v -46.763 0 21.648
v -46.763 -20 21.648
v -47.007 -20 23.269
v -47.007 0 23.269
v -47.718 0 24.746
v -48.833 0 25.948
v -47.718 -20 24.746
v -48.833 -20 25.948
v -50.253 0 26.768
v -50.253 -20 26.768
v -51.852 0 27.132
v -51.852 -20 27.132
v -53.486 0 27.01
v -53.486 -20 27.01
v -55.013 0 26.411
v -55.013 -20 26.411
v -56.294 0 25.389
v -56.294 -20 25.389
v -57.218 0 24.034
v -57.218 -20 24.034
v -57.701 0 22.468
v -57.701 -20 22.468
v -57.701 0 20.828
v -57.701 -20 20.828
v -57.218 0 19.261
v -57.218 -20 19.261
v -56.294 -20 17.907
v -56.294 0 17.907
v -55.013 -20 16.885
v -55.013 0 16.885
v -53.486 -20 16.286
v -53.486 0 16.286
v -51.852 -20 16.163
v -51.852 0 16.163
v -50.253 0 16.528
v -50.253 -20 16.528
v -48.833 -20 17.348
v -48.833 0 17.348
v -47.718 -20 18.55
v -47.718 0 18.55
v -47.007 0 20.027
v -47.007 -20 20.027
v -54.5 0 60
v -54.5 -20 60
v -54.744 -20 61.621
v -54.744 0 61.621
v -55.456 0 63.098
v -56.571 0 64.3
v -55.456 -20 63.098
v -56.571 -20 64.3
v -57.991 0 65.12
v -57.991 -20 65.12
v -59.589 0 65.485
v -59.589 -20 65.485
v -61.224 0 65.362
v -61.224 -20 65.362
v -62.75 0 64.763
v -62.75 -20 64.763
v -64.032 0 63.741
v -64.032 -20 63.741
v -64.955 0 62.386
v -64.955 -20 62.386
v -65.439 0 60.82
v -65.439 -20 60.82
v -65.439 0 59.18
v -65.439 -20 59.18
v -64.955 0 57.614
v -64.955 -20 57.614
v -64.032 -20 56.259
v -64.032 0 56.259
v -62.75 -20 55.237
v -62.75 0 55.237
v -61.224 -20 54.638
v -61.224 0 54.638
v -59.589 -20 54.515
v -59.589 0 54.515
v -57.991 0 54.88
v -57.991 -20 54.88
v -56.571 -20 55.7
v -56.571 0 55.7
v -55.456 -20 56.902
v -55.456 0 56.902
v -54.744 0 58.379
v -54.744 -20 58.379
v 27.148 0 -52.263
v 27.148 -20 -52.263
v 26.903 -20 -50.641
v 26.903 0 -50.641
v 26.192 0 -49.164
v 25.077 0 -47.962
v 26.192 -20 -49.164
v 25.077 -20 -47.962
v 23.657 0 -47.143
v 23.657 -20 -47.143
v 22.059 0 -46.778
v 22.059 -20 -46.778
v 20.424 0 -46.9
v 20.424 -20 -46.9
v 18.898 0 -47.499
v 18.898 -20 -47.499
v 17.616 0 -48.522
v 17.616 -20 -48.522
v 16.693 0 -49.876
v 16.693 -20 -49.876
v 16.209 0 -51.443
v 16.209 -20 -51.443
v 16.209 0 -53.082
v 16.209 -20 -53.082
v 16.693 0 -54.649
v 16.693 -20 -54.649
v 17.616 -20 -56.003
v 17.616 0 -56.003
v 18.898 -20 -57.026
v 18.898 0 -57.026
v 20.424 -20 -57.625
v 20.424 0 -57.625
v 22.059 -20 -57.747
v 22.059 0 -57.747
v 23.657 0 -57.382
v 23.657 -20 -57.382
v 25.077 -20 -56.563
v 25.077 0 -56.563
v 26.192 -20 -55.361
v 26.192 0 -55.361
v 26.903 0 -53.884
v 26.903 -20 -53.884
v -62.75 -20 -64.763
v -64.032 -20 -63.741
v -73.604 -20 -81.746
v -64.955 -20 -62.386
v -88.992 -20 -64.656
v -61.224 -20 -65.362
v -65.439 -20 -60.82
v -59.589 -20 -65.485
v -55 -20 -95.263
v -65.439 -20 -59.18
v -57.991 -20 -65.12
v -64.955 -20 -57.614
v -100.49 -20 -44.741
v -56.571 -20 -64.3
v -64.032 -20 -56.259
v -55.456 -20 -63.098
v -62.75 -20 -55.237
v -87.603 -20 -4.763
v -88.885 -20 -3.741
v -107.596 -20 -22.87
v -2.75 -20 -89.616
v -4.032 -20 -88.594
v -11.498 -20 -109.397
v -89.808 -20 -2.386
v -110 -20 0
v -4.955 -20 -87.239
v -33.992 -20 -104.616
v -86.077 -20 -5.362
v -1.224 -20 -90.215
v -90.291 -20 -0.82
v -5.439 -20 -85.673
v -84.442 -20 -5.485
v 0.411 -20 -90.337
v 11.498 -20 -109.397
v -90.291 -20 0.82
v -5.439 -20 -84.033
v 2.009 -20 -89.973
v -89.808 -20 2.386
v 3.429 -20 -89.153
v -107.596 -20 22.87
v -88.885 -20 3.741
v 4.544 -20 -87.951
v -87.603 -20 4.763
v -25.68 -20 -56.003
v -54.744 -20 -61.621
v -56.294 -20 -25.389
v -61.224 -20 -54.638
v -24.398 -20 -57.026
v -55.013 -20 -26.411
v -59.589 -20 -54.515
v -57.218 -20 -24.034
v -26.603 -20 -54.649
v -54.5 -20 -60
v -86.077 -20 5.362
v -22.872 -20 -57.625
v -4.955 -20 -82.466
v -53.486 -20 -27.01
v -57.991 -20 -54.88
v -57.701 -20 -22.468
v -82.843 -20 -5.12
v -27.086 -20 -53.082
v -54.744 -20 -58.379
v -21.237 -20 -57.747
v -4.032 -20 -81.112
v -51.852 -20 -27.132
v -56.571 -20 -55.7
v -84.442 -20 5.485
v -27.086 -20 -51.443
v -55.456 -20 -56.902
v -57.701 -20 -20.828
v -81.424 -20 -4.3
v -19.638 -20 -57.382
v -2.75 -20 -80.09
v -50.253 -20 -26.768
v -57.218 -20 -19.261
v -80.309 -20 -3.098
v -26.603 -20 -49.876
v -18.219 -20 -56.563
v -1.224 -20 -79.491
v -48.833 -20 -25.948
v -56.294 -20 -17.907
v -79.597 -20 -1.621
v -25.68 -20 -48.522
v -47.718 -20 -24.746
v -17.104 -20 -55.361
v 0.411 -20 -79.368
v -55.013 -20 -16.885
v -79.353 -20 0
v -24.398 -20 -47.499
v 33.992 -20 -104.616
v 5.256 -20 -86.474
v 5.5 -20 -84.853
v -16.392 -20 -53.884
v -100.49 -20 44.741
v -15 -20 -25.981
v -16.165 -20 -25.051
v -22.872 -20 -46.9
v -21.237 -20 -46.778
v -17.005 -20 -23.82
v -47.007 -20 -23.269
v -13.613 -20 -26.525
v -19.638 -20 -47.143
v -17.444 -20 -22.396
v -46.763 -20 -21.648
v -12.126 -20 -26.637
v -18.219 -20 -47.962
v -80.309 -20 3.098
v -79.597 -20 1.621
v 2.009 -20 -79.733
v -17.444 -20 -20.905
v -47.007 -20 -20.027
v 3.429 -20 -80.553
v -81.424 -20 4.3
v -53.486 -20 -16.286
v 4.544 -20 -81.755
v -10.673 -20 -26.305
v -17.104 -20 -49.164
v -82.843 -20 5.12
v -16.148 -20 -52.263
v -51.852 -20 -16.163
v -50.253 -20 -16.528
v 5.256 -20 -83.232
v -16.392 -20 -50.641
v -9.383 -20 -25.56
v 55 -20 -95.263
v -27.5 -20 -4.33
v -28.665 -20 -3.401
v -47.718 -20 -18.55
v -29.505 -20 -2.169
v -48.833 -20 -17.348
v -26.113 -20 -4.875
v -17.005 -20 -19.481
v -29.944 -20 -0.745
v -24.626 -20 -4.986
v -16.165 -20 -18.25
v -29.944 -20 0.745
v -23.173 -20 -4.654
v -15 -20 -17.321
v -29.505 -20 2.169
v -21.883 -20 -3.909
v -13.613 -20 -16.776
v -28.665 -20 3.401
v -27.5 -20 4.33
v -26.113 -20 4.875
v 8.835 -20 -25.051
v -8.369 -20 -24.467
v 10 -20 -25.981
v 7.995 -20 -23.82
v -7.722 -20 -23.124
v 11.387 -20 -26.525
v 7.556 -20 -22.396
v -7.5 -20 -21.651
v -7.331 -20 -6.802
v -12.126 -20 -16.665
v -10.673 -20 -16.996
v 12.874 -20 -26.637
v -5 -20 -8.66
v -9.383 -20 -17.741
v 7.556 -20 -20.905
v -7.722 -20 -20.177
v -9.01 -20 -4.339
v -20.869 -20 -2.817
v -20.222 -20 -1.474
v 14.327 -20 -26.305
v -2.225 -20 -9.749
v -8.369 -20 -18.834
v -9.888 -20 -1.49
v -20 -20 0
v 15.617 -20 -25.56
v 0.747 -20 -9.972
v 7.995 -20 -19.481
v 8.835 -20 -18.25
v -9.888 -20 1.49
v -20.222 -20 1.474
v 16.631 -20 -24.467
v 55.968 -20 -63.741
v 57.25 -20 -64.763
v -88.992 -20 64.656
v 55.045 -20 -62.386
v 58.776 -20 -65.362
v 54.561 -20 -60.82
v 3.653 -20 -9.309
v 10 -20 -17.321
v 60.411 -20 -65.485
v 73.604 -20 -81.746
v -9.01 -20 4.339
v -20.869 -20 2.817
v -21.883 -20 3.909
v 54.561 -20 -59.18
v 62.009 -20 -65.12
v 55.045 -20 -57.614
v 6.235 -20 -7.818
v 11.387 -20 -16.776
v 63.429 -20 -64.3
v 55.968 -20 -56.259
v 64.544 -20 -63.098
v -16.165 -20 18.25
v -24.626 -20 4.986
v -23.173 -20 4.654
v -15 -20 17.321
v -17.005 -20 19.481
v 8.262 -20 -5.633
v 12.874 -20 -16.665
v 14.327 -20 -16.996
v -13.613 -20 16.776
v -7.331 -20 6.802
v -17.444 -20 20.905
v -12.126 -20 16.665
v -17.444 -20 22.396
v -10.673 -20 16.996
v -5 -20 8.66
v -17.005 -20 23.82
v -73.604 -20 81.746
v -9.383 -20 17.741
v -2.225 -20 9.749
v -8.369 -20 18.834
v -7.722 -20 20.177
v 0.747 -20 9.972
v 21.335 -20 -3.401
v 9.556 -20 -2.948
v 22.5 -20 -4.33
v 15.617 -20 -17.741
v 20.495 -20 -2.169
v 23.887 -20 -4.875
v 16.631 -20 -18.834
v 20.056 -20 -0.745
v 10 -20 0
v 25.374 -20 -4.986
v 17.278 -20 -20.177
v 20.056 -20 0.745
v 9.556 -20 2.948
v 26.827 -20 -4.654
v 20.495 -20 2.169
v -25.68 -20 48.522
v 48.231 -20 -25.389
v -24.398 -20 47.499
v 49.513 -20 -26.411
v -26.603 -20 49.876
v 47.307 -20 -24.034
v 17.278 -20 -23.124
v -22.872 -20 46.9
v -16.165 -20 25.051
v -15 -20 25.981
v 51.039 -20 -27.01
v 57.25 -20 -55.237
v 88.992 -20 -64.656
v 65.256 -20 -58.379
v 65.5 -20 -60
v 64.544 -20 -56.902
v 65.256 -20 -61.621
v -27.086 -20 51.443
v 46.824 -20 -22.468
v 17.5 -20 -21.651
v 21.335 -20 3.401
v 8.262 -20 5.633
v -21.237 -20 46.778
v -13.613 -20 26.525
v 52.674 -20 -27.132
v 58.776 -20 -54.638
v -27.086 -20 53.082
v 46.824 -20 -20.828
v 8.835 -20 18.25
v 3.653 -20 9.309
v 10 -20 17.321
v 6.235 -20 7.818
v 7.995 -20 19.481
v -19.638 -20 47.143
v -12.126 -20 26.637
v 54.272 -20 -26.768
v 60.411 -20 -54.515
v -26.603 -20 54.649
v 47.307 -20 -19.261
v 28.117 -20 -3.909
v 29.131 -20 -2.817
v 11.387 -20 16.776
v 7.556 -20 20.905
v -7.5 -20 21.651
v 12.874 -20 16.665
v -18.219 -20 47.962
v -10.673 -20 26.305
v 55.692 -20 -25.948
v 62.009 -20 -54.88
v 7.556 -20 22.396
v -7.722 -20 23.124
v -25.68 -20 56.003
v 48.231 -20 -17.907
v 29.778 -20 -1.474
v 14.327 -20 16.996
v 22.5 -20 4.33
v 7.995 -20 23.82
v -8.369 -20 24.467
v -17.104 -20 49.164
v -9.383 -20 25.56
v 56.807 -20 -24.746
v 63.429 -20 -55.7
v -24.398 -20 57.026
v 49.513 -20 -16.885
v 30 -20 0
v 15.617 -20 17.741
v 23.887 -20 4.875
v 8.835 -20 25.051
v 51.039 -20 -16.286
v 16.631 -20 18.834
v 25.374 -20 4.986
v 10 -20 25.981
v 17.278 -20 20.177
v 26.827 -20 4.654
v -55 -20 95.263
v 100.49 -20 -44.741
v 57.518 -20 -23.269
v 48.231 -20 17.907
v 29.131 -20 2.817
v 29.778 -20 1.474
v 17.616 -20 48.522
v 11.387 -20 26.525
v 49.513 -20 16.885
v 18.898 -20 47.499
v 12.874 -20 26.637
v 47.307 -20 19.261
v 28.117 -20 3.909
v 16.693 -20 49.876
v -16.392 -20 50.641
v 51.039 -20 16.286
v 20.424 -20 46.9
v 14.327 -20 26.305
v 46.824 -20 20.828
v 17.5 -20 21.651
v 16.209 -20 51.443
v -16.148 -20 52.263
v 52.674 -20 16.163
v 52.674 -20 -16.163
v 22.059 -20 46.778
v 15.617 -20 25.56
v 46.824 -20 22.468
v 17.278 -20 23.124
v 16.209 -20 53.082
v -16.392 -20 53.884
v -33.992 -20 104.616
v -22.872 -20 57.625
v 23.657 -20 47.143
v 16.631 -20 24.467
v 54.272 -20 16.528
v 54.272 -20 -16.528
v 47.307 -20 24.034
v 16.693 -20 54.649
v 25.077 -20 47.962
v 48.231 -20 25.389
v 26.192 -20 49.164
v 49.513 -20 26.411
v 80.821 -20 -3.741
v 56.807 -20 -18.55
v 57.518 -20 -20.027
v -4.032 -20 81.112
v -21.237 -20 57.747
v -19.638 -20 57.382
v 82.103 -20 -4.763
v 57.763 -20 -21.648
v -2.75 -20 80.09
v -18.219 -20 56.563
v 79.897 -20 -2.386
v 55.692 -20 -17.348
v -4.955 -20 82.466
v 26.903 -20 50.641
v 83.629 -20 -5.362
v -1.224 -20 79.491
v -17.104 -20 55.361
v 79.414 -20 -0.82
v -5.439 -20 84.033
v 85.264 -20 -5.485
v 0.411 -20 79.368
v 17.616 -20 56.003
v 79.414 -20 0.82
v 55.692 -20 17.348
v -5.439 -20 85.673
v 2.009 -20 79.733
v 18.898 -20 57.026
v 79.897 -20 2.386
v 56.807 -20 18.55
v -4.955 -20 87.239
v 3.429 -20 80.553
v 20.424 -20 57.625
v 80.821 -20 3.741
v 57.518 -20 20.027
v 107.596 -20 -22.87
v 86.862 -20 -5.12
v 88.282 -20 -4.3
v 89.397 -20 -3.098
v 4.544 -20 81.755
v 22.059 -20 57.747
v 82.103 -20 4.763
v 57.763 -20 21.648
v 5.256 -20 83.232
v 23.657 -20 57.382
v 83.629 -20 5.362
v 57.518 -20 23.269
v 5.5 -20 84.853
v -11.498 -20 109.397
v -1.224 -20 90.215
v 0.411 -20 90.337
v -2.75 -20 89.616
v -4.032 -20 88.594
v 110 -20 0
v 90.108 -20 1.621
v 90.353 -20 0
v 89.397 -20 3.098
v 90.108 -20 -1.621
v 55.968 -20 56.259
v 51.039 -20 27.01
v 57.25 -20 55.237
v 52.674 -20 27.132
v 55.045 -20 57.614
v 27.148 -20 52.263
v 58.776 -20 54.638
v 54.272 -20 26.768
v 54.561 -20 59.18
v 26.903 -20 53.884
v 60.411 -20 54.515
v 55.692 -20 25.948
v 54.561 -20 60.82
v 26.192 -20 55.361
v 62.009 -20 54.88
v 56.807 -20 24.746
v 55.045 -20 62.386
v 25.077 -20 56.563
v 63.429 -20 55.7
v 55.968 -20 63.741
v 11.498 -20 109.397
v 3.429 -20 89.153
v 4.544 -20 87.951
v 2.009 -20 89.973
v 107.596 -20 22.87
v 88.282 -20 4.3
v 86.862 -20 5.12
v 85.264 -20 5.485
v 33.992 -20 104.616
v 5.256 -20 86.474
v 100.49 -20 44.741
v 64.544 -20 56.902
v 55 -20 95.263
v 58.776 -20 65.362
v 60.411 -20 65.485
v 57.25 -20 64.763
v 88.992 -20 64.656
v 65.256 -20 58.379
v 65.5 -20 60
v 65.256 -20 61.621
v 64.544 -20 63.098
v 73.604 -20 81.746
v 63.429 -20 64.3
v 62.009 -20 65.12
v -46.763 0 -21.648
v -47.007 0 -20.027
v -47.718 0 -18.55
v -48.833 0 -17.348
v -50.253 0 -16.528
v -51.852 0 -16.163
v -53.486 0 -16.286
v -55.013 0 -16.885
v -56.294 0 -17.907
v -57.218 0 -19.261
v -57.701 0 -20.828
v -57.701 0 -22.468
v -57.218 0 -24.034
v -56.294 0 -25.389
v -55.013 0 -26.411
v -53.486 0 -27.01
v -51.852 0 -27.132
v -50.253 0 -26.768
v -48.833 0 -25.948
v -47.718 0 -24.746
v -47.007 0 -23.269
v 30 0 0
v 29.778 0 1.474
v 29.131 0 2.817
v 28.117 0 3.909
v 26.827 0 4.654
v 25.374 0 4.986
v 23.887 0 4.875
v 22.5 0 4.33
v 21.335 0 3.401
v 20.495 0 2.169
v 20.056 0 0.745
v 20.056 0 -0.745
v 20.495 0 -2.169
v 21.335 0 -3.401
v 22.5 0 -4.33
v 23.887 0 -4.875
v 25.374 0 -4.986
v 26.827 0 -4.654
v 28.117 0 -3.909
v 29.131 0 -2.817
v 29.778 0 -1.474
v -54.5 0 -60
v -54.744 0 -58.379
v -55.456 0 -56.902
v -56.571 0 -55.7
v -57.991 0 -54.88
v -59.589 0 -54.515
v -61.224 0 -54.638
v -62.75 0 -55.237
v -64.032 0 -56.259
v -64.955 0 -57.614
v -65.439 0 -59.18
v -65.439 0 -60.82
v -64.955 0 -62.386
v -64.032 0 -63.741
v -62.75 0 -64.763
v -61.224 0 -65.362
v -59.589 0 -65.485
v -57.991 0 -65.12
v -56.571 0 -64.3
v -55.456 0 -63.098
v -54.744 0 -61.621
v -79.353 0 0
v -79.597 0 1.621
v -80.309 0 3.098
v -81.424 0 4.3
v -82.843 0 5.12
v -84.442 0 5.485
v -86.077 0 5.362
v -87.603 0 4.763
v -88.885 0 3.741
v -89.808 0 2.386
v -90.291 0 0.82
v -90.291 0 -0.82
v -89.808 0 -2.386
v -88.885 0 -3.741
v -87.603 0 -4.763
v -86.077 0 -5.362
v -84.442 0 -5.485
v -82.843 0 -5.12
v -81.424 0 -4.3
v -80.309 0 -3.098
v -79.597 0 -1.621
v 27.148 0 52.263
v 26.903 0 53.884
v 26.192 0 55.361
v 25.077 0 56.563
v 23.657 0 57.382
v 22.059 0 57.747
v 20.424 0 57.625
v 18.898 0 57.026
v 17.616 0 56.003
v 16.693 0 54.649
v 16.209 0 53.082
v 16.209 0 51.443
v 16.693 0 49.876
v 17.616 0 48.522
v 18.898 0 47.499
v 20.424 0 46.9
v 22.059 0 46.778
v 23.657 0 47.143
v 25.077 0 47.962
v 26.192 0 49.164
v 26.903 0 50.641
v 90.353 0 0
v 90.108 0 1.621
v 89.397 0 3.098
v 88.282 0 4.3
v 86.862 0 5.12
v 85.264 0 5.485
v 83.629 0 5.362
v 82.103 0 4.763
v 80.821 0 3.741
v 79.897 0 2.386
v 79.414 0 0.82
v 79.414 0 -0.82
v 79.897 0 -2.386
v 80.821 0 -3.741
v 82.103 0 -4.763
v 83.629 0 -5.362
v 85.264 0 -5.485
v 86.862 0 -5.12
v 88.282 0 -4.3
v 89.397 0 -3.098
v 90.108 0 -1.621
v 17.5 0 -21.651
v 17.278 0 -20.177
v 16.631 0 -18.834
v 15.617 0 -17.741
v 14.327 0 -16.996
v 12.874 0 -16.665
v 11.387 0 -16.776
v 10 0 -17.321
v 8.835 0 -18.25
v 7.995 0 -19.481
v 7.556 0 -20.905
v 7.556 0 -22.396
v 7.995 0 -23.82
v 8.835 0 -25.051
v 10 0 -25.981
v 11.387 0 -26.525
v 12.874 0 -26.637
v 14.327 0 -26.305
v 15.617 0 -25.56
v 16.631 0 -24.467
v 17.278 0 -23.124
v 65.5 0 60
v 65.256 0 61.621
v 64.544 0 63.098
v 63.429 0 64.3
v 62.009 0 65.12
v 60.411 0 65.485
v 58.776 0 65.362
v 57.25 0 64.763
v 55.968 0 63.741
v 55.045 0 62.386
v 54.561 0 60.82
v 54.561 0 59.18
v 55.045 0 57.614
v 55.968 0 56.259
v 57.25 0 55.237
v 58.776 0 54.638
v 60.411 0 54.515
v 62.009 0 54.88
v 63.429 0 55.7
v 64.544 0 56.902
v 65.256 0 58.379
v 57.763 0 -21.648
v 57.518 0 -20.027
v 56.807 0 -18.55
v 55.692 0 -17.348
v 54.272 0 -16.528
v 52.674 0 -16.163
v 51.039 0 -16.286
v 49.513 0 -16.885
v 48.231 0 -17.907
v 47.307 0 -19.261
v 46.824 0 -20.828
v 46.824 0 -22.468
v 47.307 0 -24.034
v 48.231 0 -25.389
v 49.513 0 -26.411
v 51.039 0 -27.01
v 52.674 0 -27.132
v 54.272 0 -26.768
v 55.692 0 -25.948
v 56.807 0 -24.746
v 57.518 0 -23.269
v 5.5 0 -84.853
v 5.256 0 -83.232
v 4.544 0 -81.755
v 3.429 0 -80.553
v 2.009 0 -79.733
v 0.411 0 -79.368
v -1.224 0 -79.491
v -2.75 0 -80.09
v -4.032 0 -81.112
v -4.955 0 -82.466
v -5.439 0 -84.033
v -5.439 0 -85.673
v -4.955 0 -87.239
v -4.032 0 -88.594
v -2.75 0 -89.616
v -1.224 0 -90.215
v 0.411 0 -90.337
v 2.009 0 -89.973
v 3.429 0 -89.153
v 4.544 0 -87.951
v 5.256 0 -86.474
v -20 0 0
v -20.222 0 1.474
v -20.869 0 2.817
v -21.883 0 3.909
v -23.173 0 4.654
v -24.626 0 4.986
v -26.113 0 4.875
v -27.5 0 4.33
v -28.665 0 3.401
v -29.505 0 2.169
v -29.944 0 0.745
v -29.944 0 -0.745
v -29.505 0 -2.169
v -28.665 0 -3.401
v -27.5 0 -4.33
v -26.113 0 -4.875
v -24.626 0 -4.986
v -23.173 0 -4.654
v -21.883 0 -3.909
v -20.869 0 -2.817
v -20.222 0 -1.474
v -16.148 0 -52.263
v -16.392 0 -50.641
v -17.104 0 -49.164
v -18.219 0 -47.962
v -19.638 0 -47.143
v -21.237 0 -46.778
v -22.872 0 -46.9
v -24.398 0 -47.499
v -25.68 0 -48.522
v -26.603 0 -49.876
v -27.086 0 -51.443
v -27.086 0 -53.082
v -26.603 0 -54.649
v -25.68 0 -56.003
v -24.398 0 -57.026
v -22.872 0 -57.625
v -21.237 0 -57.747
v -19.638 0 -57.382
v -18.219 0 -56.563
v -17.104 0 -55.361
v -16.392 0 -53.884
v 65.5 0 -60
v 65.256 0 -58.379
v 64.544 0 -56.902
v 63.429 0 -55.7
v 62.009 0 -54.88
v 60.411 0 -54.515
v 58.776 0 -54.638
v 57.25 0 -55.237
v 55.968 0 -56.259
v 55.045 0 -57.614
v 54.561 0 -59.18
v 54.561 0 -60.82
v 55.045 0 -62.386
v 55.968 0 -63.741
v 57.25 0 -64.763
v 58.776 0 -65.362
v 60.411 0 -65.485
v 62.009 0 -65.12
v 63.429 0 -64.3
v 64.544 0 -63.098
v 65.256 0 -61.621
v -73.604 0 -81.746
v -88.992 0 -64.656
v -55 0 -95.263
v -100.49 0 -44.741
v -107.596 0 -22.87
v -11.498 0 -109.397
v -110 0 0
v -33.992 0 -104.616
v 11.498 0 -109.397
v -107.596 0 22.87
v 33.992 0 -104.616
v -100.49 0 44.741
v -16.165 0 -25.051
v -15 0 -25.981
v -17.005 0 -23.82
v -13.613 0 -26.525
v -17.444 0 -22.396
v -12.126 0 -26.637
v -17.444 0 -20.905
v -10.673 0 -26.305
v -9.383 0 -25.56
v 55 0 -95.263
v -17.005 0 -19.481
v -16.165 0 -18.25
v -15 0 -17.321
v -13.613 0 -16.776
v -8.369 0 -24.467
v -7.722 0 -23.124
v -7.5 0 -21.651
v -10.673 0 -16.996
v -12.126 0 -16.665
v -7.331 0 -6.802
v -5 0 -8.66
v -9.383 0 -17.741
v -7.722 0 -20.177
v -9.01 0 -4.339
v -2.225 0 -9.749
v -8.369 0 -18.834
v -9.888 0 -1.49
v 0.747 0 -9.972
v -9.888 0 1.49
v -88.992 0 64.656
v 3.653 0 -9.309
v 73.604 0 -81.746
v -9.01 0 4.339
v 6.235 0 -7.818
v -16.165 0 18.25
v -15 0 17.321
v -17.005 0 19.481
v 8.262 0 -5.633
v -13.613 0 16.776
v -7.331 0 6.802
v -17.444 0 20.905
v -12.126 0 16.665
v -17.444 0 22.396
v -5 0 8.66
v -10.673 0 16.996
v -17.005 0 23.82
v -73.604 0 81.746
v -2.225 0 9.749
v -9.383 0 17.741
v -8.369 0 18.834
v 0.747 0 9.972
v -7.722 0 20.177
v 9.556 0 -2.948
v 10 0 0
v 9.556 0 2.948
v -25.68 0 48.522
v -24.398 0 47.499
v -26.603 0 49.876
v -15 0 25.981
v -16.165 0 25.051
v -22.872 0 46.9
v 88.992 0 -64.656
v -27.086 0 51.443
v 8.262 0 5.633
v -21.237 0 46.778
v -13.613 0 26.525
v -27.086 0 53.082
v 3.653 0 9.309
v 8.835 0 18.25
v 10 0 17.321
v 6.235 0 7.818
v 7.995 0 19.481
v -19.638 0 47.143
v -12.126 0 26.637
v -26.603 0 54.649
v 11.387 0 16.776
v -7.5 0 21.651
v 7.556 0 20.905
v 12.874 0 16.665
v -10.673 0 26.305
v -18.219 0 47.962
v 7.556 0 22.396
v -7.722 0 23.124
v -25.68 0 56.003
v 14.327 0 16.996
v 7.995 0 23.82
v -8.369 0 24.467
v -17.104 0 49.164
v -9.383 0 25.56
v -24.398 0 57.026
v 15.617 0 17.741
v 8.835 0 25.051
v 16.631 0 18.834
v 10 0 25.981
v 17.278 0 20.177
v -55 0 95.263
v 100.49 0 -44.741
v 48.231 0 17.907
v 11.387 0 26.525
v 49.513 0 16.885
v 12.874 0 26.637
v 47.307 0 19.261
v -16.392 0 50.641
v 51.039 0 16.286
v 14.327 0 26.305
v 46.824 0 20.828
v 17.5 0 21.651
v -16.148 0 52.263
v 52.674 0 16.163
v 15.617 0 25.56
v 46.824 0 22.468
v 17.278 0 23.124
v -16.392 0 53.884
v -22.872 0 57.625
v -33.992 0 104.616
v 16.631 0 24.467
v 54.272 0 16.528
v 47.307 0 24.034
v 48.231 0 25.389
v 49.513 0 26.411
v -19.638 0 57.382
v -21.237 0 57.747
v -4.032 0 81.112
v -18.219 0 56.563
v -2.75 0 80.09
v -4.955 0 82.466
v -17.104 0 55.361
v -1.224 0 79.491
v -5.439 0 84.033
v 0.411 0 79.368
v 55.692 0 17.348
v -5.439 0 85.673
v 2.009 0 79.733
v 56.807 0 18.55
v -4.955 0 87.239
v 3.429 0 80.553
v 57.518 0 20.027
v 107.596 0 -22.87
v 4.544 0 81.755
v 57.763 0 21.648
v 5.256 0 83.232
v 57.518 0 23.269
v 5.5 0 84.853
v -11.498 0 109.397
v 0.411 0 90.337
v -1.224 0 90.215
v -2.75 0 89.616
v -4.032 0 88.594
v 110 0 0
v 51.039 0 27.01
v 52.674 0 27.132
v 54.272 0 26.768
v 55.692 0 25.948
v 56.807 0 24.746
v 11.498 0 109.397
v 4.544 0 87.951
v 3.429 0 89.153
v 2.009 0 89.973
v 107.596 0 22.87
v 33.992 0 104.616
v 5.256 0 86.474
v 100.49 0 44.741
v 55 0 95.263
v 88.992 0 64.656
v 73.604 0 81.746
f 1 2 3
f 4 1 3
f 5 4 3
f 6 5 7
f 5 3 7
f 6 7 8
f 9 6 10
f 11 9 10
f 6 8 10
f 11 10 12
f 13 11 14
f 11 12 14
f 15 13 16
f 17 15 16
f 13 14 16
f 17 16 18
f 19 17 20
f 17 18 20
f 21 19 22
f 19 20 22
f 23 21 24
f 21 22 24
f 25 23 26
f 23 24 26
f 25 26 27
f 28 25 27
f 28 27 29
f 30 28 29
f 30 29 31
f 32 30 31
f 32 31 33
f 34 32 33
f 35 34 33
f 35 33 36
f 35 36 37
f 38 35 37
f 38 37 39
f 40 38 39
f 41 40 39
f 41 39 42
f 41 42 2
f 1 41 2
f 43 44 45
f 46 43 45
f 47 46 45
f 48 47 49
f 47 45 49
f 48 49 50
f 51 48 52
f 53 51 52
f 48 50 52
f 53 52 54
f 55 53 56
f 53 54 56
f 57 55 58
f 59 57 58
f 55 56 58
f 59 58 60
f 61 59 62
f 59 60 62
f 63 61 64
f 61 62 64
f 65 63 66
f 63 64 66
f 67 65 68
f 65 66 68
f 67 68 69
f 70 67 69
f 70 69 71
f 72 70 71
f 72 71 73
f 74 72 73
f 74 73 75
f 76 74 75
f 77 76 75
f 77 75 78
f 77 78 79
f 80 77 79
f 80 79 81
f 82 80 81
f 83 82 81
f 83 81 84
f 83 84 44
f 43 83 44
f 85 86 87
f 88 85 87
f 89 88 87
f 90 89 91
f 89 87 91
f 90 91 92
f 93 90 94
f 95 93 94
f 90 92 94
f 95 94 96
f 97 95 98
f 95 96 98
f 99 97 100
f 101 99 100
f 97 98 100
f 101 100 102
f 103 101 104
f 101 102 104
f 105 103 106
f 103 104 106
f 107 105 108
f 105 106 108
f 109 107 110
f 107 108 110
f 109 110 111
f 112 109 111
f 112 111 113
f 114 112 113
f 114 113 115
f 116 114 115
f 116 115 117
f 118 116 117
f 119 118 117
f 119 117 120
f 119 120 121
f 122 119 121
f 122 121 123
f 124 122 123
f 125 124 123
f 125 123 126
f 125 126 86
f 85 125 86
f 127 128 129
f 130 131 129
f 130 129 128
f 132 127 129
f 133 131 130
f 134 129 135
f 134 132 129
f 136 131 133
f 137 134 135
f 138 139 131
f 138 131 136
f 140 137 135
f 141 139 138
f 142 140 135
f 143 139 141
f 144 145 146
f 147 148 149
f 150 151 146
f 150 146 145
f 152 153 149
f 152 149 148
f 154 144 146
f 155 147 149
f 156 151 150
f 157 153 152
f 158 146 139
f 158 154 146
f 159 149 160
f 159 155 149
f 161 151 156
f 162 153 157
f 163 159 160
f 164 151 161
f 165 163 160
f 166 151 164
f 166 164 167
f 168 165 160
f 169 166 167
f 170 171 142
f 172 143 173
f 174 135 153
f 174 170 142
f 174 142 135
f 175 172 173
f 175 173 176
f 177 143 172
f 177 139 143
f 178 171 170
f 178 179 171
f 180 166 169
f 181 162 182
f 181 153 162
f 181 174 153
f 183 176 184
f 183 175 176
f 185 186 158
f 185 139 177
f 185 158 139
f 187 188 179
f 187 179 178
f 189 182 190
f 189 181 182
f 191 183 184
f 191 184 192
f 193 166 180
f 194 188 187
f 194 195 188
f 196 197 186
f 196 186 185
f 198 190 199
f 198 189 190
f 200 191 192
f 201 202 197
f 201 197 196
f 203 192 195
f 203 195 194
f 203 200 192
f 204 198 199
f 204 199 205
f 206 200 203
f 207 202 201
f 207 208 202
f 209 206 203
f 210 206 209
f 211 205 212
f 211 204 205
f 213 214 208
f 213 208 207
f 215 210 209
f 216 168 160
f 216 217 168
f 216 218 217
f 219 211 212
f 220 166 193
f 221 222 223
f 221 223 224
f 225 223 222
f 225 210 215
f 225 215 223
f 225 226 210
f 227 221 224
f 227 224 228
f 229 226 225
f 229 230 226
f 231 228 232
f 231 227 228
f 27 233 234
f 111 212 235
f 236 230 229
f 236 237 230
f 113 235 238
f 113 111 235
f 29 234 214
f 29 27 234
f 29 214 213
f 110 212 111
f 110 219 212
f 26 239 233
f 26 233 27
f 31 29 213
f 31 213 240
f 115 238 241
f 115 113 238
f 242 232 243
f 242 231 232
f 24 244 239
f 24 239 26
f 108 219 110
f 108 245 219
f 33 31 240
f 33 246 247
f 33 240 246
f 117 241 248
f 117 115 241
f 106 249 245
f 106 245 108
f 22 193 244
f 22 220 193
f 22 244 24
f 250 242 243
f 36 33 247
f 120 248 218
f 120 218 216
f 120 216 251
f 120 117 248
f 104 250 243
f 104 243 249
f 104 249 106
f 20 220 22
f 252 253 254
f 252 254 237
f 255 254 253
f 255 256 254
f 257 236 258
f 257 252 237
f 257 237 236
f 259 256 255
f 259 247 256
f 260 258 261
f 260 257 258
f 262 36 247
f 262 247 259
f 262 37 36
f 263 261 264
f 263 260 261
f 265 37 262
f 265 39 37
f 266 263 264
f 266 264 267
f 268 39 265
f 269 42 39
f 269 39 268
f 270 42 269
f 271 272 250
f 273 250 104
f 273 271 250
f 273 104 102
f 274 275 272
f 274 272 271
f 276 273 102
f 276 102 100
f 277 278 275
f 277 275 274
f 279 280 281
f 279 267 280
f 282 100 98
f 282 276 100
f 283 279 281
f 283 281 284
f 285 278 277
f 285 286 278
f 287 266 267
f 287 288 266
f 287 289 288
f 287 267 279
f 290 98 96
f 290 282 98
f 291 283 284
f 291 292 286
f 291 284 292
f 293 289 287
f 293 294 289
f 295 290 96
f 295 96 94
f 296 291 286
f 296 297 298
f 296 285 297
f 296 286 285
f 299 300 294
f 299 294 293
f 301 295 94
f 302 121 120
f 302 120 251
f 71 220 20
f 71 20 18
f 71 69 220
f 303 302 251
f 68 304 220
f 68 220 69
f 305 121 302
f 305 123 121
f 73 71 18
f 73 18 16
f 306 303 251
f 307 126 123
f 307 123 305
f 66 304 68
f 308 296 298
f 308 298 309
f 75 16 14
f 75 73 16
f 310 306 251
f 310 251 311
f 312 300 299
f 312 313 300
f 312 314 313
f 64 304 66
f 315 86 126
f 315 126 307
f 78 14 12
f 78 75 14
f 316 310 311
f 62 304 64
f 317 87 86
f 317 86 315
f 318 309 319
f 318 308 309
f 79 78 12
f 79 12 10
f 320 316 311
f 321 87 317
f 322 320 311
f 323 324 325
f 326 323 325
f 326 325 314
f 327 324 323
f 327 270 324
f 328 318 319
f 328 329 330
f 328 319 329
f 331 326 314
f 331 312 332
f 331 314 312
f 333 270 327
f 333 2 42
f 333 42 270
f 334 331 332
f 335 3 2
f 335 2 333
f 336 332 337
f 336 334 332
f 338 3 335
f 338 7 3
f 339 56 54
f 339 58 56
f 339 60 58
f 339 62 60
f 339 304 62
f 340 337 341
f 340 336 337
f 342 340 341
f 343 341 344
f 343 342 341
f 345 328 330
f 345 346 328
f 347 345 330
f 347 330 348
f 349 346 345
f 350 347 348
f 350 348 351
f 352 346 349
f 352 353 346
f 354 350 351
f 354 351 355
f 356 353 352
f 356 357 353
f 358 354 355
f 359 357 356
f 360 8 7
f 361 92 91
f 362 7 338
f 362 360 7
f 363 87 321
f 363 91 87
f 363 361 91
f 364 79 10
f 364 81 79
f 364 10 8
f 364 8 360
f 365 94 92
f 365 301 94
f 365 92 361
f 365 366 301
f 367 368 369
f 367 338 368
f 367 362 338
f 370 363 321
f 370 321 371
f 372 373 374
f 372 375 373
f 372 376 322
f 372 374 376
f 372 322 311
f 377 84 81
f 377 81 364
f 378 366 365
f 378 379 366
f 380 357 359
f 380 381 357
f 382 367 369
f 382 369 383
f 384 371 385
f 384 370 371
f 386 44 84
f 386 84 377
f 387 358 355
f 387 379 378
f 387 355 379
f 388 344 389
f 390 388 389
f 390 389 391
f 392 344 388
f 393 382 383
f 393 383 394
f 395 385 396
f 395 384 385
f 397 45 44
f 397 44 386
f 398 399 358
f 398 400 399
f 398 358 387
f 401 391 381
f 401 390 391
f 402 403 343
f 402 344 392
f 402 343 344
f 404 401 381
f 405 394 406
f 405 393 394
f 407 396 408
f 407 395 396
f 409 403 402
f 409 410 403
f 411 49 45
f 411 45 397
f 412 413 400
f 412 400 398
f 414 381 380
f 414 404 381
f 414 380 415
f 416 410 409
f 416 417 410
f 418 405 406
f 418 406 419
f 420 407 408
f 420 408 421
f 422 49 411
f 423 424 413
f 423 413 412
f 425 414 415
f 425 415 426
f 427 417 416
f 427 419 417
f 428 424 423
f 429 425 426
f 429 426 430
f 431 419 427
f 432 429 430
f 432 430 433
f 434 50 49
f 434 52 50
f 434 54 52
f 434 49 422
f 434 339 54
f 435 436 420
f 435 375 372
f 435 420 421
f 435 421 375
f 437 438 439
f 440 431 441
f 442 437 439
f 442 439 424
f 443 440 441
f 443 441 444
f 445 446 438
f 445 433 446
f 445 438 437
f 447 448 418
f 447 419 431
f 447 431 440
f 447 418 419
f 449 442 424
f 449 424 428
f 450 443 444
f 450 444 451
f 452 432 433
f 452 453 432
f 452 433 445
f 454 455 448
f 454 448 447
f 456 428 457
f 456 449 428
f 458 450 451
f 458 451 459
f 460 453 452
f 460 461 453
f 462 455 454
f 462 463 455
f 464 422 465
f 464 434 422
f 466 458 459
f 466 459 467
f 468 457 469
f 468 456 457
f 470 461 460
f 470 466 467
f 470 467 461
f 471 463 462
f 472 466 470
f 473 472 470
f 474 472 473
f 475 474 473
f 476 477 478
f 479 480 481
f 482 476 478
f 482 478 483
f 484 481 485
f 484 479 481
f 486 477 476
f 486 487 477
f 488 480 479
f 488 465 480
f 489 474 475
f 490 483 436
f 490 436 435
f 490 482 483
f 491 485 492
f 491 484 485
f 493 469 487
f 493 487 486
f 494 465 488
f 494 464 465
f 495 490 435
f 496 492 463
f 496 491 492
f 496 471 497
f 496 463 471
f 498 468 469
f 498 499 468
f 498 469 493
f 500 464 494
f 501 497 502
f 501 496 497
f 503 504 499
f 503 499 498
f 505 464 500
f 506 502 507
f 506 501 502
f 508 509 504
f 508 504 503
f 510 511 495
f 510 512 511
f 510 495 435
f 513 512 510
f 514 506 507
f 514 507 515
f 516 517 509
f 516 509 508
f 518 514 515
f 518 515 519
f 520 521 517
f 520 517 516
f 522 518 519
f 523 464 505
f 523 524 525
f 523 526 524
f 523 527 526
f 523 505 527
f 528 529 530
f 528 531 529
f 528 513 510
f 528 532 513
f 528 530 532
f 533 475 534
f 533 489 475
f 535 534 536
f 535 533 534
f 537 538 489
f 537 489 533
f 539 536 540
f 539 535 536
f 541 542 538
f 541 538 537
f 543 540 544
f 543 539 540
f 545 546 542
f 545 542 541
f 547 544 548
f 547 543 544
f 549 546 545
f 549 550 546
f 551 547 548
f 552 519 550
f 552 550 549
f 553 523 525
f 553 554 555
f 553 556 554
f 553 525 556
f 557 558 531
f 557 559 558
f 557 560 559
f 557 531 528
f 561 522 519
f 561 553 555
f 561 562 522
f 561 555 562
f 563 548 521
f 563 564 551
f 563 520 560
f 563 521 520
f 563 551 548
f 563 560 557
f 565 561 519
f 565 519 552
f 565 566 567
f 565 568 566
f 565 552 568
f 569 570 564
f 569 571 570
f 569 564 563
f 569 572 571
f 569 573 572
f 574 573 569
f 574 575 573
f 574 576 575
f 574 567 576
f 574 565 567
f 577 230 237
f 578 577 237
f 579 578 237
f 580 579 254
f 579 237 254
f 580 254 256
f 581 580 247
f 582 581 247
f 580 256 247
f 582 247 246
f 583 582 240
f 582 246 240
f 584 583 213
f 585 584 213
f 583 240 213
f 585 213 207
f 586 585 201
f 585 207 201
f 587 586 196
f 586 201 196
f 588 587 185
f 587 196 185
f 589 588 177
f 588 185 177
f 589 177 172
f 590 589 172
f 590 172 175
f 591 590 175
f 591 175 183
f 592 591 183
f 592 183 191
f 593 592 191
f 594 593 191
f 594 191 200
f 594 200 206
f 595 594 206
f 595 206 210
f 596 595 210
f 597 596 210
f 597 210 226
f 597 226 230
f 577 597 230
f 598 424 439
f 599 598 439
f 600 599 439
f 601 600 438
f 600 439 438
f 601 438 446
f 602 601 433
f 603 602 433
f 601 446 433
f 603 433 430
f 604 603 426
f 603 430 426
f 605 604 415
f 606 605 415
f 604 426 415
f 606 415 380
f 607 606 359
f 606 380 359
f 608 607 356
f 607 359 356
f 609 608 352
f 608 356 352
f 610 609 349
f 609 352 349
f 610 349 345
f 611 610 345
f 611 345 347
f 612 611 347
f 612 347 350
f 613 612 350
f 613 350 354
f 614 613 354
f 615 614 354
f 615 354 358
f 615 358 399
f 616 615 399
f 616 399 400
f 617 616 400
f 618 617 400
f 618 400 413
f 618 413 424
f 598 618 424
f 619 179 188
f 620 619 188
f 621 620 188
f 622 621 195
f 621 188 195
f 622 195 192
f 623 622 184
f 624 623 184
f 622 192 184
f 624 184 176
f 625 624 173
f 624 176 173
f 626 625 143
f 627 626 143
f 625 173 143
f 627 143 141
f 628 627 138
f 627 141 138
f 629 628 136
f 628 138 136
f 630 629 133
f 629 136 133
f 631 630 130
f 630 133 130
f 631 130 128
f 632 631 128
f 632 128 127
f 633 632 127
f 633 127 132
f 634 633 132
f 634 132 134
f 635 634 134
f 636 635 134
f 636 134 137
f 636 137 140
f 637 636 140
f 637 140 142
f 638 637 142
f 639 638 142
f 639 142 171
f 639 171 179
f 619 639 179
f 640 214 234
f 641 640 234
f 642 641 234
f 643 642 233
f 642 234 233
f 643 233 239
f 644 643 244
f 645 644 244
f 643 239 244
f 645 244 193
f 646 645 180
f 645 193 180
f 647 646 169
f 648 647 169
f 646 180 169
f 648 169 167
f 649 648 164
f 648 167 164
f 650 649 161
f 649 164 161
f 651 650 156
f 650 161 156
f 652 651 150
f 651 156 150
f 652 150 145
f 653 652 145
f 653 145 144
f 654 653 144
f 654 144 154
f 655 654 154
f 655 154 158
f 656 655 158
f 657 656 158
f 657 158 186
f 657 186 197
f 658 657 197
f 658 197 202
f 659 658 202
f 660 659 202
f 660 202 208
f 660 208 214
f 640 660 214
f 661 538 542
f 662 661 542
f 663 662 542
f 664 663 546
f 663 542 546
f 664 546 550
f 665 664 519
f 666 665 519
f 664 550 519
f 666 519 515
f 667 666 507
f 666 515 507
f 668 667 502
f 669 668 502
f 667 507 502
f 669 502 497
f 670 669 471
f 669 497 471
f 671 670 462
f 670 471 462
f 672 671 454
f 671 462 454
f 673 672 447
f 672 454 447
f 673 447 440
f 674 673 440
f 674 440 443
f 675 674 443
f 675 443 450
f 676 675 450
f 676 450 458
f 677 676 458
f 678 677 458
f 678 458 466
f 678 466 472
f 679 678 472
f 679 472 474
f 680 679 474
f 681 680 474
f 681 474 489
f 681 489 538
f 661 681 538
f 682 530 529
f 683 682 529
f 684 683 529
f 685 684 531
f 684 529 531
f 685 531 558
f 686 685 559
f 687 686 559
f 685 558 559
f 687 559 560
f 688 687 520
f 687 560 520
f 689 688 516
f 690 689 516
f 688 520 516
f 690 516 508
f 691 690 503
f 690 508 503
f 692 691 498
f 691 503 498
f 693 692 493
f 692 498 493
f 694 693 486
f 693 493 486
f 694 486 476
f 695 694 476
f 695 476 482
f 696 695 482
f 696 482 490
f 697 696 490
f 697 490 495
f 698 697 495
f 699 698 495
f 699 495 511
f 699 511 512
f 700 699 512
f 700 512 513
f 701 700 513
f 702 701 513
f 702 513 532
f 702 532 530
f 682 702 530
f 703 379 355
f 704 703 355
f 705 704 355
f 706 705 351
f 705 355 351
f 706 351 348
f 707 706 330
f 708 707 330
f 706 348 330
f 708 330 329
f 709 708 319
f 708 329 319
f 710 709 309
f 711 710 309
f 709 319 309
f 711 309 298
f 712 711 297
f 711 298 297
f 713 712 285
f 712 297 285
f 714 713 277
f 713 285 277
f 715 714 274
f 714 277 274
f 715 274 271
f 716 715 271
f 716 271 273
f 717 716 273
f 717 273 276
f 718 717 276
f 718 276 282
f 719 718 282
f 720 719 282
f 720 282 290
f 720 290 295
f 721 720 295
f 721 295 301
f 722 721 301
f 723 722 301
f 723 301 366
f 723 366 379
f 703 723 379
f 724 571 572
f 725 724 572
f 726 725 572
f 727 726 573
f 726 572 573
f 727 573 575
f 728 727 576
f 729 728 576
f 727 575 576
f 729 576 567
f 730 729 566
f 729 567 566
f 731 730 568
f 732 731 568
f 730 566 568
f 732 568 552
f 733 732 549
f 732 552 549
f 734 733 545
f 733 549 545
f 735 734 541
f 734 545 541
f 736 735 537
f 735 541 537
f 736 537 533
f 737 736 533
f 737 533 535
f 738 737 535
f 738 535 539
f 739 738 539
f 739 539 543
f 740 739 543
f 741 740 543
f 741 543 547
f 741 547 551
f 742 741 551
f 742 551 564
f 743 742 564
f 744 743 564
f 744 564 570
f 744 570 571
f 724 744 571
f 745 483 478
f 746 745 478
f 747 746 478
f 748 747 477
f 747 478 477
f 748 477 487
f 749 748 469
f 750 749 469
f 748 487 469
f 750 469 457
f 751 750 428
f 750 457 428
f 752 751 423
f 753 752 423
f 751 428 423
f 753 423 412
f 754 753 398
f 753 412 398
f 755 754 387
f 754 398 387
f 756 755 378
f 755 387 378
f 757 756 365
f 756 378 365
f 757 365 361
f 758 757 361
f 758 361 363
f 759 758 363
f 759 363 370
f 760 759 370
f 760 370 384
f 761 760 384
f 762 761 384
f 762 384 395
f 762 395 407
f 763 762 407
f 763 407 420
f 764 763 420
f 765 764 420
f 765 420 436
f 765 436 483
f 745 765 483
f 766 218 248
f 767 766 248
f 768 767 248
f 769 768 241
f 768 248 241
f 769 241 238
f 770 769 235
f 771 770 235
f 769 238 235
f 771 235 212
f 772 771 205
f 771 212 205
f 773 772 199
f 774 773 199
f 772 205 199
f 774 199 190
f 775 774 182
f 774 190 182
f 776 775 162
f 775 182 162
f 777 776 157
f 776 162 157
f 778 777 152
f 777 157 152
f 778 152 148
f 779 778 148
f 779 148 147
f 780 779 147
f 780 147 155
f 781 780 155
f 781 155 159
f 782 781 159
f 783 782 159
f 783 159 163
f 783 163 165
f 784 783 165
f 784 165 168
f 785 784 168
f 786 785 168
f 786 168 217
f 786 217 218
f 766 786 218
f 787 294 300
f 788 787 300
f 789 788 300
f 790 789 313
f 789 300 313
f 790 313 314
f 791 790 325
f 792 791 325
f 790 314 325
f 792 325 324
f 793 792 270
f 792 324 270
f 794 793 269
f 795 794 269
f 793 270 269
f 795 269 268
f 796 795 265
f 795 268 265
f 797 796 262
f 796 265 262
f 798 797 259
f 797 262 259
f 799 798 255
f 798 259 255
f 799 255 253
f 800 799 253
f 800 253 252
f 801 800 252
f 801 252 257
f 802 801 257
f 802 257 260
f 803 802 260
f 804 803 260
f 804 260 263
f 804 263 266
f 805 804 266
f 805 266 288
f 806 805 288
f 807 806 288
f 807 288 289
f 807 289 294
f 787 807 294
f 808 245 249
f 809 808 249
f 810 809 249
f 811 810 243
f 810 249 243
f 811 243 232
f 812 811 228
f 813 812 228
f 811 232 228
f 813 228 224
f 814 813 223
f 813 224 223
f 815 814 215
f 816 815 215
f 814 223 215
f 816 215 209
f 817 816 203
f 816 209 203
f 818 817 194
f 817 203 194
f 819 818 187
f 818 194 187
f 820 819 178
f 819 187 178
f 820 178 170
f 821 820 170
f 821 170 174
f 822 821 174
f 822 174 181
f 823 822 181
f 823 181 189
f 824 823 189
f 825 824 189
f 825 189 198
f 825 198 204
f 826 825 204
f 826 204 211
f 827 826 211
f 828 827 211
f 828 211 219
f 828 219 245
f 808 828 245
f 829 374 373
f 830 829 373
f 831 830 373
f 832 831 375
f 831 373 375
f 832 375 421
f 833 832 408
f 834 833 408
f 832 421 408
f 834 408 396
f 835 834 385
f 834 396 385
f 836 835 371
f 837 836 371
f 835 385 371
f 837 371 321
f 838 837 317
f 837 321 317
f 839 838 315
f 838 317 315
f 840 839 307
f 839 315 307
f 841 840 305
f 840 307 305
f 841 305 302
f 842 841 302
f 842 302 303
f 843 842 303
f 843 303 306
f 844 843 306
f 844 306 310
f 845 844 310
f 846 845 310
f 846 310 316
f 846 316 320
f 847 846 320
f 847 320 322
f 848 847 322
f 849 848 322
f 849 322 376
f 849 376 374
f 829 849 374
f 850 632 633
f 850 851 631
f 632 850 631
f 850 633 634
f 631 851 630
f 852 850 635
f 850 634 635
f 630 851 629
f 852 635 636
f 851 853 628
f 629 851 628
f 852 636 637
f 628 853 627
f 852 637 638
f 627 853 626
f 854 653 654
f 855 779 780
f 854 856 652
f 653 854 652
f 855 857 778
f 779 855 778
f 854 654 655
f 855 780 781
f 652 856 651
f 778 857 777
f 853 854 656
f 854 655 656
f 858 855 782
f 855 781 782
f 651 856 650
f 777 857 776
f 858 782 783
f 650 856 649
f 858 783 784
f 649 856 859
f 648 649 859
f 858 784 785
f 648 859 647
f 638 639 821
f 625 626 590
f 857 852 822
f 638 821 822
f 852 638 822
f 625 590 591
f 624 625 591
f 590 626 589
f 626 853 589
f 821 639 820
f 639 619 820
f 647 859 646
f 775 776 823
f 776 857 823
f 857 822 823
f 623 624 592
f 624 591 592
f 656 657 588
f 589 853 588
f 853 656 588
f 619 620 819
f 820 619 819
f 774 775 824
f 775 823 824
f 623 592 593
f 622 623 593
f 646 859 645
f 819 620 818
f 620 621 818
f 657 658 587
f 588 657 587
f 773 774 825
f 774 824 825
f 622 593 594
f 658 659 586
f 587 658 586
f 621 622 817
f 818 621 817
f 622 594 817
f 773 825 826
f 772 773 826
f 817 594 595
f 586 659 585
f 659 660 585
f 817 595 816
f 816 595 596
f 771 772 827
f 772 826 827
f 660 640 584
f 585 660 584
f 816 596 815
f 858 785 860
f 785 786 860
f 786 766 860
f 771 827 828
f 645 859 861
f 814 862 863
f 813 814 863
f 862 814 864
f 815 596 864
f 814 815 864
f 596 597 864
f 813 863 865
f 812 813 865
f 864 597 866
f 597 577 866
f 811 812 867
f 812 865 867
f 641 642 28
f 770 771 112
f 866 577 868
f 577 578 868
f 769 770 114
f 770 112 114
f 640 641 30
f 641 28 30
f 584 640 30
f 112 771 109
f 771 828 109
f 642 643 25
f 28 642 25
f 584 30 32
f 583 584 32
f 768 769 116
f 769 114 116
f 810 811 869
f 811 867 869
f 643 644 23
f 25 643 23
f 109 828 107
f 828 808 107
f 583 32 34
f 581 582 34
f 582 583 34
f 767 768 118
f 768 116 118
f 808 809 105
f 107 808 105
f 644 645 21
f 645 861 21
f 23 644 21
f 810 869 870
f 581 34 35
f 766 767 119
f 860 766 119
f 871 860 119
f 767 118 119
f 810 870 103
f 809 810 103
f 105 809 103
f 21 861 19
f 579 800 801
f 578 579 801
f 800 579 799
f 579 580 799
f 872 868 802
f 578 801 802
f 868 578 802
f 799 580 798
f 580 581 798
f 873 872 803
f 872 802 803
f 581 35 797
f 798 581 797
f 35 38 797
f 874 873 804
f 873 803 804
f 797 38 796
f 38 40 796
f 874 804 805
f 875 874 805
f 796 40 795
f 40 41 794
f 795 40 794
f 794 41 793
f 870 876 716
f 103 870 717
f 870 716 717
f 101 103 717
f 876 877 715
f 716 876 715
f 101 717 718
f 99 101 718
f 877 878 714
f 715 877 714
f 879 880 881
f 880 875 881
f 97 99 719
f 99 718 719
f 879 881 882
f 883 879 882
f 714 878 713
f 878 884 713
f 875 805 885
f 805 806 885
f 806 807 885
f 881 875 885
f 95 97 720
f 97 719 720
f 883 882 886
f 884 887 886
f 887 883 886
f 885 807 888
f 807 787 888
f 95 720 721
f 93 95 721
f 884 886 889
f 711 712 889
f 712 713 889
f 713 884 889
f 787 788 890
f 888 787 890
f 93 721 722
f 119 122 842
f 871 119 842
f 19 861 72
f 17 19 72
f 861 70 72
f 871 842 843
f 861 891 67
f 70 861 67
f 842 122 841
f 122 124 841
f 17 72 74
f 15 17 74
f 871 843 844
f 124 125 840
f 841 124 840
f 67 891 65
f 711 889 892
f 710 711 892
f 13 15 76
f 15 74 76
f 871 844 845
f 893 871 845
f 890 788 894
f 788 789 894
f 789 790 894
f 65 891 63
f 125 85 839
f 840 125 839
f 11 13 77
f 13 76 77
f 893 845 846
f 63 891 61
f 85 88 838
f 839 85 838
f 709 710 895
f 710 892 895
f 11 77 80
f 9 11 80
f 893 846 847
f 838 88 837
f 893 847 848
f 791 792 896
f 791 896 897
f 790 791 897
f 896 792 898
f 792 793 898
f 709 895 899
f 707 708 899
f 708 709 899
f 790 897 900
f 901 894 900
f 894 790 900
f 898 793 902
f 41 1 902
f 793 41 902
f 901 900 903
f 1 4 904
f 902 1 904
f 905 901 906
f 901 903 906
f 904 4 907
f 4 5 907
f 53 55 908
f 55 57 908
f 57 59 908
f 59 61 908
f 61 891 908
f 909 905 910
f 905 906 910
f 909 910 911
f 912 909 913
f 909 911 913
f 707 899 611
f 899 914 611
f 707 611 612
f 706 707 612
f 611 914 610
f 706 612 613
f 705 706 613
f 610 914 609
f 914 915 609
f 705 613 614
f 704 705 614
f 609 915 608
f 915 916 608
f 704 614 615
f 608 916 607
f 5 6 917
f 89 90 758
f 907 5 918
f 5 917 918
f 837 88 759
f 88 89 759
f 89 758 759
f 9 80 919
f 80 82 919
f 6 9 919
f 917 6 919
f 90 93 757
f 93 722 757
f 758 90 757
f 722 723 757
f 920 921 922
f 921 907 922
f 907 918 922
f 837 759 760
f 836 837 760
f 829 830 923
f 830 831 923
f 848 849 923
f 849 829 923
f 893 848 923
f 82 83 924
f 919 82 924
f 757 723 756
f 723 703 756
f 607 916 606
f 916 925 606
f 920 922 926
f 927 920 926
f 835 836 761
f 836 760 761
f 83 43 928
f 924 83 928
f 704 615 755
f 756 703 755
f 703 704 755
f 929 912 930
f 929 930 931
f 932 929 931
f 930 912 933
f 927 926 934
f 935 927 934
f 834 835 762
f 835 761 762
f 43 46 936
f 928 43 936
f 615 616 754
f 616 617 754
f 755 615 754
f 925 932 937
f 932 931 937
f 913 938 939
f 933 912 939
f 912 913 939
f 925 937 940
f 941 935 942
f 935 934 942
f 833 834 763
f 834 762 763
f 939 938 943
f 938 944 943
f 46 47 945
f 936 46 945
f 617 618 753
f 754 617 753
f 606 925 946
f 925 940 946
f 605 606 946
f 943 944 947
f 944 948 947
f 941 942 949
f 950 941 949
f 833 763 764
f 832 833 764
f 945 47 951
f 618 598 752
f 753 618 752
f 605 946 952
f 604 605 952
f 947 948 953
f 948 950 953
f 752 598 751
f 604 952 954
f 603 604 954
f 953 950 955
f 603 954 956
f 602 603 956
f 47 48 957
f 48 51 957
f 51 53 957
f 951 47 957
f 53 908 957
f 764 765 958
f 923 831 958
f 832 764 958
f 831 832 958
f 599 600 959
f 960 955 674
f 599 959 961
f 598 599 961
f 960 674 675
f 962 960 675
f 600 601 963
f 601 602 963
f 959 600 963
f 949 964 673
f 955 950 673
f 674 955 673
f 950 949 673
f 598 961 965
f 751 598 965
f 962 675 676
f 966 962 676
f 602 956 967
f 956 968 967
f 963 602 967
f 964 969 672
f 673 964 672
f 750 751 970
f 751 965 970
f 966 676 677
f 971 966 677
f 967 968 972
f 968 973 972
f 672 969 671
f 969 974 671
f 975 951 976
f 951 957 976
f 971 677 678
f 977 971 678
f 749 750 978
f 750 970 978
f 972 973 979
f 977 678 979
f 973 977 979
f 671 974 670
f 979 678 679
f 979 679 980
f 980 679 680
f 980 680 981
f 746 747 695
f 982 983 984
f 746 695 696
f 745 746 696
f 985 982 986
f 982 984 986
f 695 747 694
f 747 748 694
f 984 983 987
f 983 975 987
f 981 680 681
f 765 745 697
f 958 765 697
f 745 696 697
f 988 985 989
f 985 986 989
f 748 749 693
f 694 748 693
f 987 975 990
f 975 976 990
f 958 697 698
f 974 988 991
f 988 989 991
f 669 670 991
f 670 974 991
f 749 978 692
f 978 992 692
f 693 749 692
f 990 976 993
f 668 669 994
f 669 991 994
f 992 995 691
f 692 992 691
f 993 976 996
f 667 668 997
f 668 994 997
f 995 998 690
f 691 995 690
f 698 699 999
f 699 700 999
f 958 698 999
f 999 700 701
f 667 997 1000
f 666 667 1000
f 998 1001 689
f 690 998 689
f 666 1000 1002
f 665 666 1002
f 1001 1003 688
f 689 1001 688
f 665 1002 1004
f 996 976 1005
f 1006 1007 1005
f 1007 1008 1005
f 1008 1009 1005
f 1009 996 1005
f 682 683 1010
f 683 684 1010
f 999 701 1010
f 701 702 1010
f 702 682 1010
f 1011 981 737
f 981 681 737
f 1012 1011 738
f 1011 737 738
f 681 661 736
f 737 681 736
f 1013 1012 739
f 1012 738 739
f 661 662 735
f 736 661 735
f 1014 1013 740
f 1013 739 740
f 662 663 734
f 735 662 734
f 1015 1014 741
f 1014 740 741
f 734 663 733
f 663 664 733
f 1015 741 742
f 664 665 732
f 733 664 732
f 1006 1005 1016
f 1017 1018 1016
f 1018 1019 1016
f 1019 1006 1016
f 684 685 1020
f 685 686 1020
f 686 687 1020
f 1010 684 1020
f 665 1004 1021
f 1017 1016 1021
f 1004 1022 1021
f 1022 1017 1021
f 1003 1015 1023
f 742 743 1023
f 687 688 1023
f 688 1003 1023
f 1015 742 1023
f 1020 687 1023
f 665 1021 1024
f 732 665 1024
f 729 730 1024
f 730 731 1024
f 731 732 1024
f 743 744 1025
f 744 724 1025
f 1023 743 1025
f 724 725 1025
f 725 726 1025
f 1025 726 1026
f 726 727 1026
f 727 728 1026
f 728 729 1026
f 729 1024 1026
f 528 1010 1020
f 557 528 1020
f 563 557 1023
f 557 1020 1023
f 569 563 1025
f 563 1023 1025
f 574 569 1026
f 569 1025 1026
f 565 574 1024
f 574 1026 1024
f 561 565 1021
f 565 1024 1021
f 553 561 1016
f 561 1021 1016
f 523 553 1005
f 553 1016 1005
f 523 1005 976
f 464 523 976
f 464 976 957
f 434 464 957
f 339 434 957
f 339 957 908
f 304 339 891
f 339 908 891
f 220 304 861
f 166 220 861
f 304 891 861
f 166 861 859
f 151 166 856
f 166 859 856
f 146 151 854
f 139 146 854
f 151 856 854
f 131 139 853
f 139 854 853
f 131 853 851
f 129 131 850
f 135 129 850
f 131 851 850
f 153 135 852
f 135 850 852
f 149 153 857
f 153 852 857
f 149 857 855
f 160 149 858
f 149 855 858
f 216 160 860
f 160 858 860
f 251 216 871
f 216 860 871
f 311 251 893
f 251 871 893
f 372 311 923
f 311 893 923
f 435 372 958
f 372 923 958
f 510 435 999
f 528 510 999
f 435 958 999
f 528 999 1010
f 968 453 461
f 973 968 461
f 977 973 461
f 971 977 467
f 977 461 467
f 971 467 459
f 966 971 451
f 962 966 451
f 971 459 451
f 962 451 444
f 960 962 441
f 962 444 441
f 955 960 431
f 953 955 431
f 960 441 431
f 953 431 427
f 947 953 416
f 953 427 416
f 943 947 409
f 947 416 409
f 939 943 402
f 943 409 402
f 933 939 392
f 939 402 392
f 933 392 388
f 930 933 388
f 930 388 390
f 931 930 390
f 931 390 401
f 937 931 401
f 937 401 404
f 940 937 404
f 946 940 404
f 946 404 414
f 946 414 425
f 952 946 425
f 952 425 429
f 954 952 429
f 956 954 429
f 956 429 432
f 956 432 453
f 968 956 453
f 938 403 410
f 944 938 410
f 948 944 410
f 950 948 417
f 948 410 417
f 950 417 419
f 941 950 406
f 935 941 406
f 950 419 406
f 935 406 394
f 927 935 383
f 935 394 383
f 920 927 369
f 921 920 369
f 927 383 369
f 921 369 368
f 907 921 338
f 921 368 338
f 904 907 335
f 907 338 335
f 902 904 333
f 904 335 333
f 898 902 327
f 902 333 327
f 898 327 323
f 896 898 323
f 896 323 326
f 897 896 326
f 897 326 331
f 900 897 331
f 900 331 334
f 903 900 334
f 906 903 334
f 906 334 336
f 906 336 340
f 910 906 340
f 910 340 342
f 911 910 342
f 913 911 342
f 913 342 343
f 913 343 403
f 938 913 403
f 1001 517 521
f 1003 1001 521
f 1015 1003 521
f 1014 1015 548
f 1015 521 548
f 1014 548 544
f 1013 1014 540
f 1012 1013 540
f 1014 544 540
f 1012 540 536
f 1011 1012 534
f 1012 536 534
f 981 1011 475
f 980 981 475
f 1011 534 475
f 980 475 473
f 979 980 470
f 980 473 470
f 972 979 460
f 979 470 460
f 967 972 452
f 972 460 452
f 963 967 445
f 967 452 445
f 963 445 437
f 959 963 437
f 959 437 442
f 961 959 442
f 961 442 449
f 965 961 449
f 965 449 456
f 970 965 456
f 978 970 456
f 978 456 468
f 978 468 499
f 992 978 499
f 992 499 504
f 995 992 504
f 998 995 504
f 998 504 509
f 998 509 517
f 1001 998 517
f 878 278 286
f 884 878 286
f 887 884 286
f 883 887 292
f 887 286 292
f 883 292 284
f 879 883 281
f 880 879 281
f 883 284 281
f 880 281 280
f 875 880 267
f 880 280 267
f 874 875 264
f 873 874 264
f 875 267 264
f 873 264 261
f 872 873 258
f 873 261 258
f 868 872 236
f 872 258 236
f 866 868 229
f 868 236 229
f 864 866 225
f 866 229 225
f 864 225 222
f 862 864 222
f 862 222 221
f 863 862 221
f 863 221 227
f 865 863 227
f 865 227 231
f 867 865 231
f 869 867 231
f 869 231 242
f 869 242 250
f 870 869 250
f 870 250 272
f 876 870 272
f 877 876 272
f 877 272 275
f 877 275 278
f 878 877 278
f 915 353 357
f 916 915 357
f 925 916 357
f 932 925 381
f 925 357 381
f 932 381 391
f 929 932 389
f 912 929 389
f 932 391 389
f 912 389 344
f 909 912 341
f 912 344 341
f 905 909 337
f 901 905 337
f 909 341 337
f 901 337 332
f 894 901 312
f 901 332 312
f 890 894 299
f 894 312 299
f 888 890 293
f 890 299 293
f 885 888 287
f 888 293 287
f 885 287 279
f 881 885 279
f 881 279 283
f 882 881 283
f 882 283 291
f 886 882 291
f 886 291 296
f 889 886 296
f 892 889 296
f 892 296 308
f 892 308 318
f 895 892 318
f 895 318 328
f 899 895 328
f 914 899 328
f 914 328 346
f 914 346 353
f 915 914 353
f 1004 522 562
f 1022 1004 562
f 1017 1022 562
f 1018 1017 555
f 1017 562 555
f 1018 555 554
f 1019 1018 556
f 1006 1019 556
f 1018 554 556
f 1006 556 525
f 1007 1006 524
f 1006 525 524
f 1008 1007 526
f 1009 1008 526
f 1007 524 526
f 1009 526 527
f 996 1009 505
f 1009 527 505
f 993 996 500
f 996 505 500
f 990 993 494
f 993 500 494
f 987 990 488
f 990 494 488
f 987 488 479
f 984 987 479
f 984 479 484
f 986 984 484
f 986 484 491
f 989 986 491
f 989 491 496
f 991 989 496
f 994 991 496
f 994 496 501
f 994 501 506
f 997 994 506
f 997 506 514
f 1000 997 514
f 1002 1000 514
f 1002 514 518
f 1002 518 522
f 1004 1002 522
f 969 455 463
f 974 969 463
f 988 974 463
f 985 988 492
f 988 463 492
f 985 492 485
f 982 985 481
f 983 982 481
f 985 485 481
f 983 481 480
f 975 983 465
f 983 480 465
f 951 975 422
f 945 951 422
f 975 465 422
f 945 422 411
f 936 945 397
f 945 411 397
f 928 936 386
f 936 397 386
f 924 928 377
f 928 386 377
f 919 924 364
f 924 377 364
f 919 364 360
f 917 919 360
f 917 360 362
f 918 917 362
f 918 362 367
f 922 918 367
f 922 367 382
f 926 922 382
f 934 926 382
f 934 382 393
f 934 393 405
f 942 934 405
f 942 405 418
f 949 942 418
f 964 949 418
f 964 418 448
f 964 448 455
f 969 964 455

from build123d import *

# Parameters (mm, degrees)
F0_R     = 110
F1_DEPTH = 20
F2_R     = 5.5
F2_R_2   = 10
F3_DEPTH = 25
F4_R     = 5
F5_DEPTH = 25


with BuildPart() as f1:
    # F0 (on Front) → F1 (new body)
    with BuildSketch(Plane.XZ):
        Circle(F0_R)
    extrude(amount=F1_DEPTH)

    # F2 (on face) → F3 (cut)
    with BuildSketch(Plane.XZ.offset(20)):
        with Locations((84.852814, 0)):
            Circle(F2_R)
        with Locations((60, 60)):
            Circle(F2_R)
        with Locations((0, 84.852814)):
            Circle(F2_R)
        with Locations((-60, 60)):
            Circle(F2_R)
        with Locations((-84.852814, 0)):
            Circle(F2_R)
        with Locations((-60, -60)):
            Circle(F2_R)
        with Locations((0, -84.852814)):
            Circle(F2_R)
        with Locations((60, -60)):
            Circle(F2_R)
        Circle(F2_R_2)
        with Locations((52.262519, 21.647844)):
            Circle(F2_R)
        with Locations((52.262519, -21.647844)):
            Circle(F2_R)
        with Locations((21.647844, -52.262519)):
            Circle(F2_R)
        with Locations((-21.647844, -52.262519)):
            Circle(F2_R)
        with Locations((-52.262519, -21.647844)):
            Circle(F2_R)
        with Locations((-52.262519, 21.647844)):
            Circle(F2_R)
        with Locations((-21.647844, 52.262519)):
            Circle(F2_R)
        with Locations((21.647844, 52.262519)):
            Circle(F2_R)
    extrude(amount=-F3_DEPTH, mode=Mode.SUBTRACT)

    # F4 (on face) → F5 (cut)
    with BuildSketch(Plane.XZ.offset(20)):
        with Locations((25, 0)):
            Circle(F4_R)
        with Locations((12.5, 21.650635)):
            Circle(F4_R)
        with Locations((-12.5, 21.650635)):
            Circle(F4_R)
        with Locations((-25, 0)):
            Circle(F4_R)
        with Locations((-12.5, -21.650635)):
            Circle(F4_R)
        with Locations((12.5, -21.650635)):
            Circle(F4_R)
    extrude(amount=-F5_DEPTH, mode=Mode.SUBTRACT)


solid = f1.part
